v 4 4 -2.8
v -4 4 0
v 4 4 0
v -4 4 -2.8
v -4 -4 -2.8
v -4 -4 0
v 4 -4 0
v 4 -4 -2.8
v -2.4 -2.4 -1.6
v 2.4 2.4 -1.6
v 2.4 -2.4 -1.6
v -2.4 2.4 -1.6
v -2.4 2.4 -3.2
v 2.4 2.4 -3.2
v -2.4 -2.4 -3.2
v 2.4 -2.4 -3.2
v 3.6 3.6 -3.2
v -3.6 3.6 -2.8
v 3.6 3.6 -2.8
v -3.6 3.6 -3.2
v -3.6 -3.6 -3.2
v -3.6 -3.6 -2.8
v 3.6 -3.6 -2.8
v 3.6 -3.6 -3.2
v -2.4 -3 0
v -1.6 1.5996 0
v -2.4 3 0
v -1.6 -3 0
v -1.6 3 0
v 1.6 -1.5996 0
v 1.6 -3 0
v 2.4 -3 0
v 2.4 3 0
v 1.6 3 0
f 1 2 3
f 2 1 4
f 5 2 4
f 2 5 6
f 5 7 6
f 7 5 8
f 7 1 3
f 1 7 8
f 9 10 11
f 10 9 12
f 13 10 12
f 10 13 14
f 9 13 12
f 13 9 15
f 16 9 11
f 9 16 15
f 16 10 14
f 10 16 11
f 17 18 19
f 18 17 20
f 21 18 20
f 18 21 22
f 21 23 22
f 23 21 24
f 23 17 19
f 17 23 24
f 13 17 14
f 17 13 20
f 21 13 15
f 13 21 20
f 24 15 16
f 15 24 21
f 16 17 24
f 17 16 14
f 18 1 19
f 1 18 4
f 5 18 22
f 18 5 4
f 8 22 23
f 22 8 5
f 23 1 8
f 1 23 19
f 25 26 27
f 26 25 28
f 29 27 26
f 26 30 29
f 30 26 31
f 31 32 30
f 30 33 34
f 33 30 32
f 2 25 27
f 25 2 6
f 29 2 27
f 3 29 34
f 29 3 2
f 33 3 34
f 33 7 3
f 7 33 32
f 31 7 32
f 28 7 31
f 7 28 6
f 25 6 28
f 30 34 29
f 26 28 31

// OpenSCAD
// file: ../p/box5.scad
use <../lib.scad>
function ldraw_lib__box5() = [
// 0 Box with 5 Faces and All Edges
// 0 Name: box5.dat
// 0 Author: James Jessiman
// 0 !LDRAW_ORG Primitive UPDATE 2012-01
// 0 !LICENSE Licensed under CC BY 2.0 and CC BY 4.0 : see CAreadme.txt
// 
// 0 BFC CERTIFY CCW
  [0,"BFC","CERTIFY"],
  [0,"BFC","CCW"],
// 
// 0 !HISTORY 2002-04-03 [sbliss] Modified for BFC compliance
// 0 !HISTORY 2002-04-25 [PTadmin] Official Update 2002-02
// 0 !HISTORY 2007-06-24 [PTadmin] Header formatted for Contributor Agreement
// 0 !HISTORY 2008-07-01 [PTadmin] Official Update 2008-01
// 0 !HISTORY 2012-02-16 [Philo] Changed to CCW
// 0 !HISTORY 2012-03-30 [PTadmin] Official Update 2012-01
// 
// 
// 2 24 1 1 1 -1 1 1
  [2,24,1,1,1,-1,1,1],
// 2 24 -1 1 1 -1 1 -1
  [2,24,-1,1,1,-1,1,-1],
// 2 24 -1 1 -1 1 1 -1
  [2,24,-1,1,-1,1,1,-1],
// 2 24 1 1 -1 1 1 1
  [2,24,1,1,-1,1,1,1],
// 2 24 1 0 1 -1 0 1
  [2,24,1,0,1,-1,0,1],
// 2 24 -1 0 1 -1 0 -1
  [2,24,-1,0,1,-1,0,-1],
// 2 24 -1 0 -1 1 0 -1
  [2,24,-1,0,-1,1,0,-1],
// 2 24 1 0 -1 1 0 1
  [2,24,1,0,-1,1,0,1],
// 2 24 1 0 1 1 1 1
  [2,24,1,0,1,1,1,1],
// 2 24 -1 0 1 -1 1 1
  [2,24,-1,0,1,-1,1,1],
// 2 24 1 0 -1 1 1 -1
  [2,24,1,0,-1,1,1,-1],
// 2 24 -1 0 -1 -1 1 -1
  [2,24,-1,0,-1,-1,1,-1],
// 4 16 -1 1 1 1 1 1 1 1 -1 -1 1 -1
  [4,16,-1,1,1,1,1,1,1,1,-1,-1,1,-1],
// 4 16 -1 1 1 -1 0 1 1 0 1 1 1 1
  [4,16,-1,1,1,-1,0,1,1,0,1,1,1,1],
// 4 16 -1 1 -1 -1 0 -1 -1 0 1 -1 1 1
  [4,16,-1,1,-1,-1,0,-1,-1,0,1,-1,1,1],
// 4 16 1 1 -1 1 0 -1 -1 0 -1 -1 1 -1
  [4,16,1,1,-1,1,0,-1,-1,0,-1,-1,1,-1],
// 4 16 1 1 1 1 0 1 1 0 -1 1 1 -1
  [4,16,1,1,1,1,0,1,1,0,-1,1,1,-1],
];
makepoly(ldraw_lib__box5(), line=0.2);
// file: ../p/box4.scad
use <../lib.scad>
function ldraw_lib__box4() = [
// 0 Box with 4 Faces (2 Parallel Pairs) and All Edges
// 0 Name: box4.dat
// 0 Author: James Jessiman
// 0 !LDRAW_ORG Primitive UPDATE 2012-01
// 0 !LICENSE Licensed under CC BY 2.0 and CC BY 4.0 : see CAreadme.txt
// 
// 0 BFC CERTIFY CCW
  [0,"BFC","CERTIFY"],
  [0,"BFC","CCW"],
// 
// 0 !HISTORY 2002-04-03 [sbliss] Modified for BFC compliance
// 0 !HISTORY 2002-04-25 [PTadmin] Official Update 2002-02
// 0 !HISTORY 2007-06-24 [PTadmin] Header formatted for Contributor Agreement
// 0 !HISTORY 2008-07-01 [PTadmin] Official Update 2008-01
// 0 !HISTORY 2012-02-16 [Philo] Changed to CCW
// 0 !HISTORY 2012-03-30 [PTadmin] Official Update 2012-01
// 
// 
// 2 24 1 1 1 -1 1 1
  [2,24,1,1,1,-1,1,1],
// 2 24 -1 1 1 -1 1 -1
  [2,24,-1,1,1,-1,1,-1],
// 2 24 -1 1 -1 1 1 -1
  [2,24,-1,1,-1,1,1,-1],
// 2 24 1 1 -1 1 1 1
  [2,24,1,1,-1,1,1,1],
// 2 24 1 0 1 -1 0 1
  [2,24,1,0,1,-1,0,1],
// 2 24 -1 0 1 -1 0 -1
  [2,24,-1,0,1,-1,0,-1],
// 2 24 -1 0 -1 1 0 -1
  [2,24,-1,0,-1,1,0,-1],
// 2 24 1 0 -1 1 0 1
  [2,24,1,0,-1,1,0,1],
// 2 24 1 0 1 1 1 1
  [2,24,1,0,1,1,1,1],
// 2 24 -1 0 1 -1 1 1
  [2,24,-1,0,1,-1,1,1],
// 2 24 1 0 -1 1 1 -1
  [2,24,1,0,-1,1,1,-1],
// 2 24 -1 0 -1 -1 1 -1
  [2,24,-1,0,-1,-1,1,-1],
// 4 16 -1 1 1 -1 0 1 1 0 1 1 1 1
  [4,16,-1,1,1,-1,0,1,1,0,1,1,1,1],
// 4 16 -1 1 -1 -1 0 -1 -1 0 1 -1 1 1
  [4,16,-1,1,-1,-1,0,-1,-1,0,1,-1,1,1],
// 4 16 1 1 -1 1 0 -1 -1 0 -1 -1 1 -1
  [4,16,1,1,-1,1,0,-1,-1,0,-1,-1,1,-1],
// 4 16 1 1 1 1 0 1 1 0 -1 1 1 -1
  [4,16,1,1,1,1,0,1,1,0,-1,1,1,-1],
];
makepoly(ldraw_lib__box4(), line=0.2);
// file: s/3070bs01.scad
use <../../lib.scad>
use <../../p/box4.scad>
use <../../p/box5.scad>
function ldraw_lib__s__3070bs01() = [
// 0 ~Tile  1 x  1 with Groove without Top Face
// 0 Name: s\3070bs01.dat
// 0 Author: Chris Dee [cwdee]
// 0 !LDRAW_ORG Subpart UPDATE 2009-02
// 0 !LICENSE Licensed under CC BY 2.0 and CC BY 4.0 : see CAreadme.txt
// 
// 0 BFC CERTIFY CCW
  [0,"BFC","CERTIFY"],
  [0,"BFC","CCW"],
// 
// 0 !HISTORY 2009-09-03 [PTadmin] Official Update 2009-02
// 
// 
// 1 16 0 0 0 10 0 0 0 7 0 0 0 10 box4.dat
  [1,16,0,0,0,10,0,0,0,7,0,0,0,10, ldraw_lib__box4()],
// 0 BFC INVERTNEXT
  [0,"BFC","INVERTNEXT"],
// 1 16 0 8 0 6 0 0 0 -4 0 0 0 6 box5.dat
  [1,16,0,8,0,6,0,0,0,-4,0,0,0,6, ldraw_lib__box5()],
// 1 16 0 7 0 9 0 0 0 1 0 0 0 9 box4.dat
  [1,16,0,7,0,9,0,0,0,1,0,0,0,9, ldraw_lib__box4()],
// 
// 4 16 9 8 9 6 8 6 -6 8 6 -9 8 9
  [4,16,9,8,9,6,8,6,-6,8,6,-9,8,9],
// 4 16 -9 8 9 -6 8 6 -6 8 -6 -9 8 -9
  [4,16,-9,8,9,-6,8,6,-6,8,-6,-9,8,-9],
// 4 16 -9 8 -9 -6 8 -6 6 8 -6 9 8 -9
  [4,16,-9,8,-9,-6,8,-6,6,8,-6,9,8,-9],
// 4 16 9 8 -9 6 8 -6 6 8 6 9 8 9
  [4,16,9,8,-9,6,8,-6,6,8,6,9,8,9],
// 
// 4 16 10 7 10 9 7 9 -9 7 9 -10 7 10
  [4,16,10,7,10,9,7,9,-9,7,9,-10,7,10],
// 4 16 -10 7 10 -9 7 9 -9 7 -9 -10 7 -10
  [4,16,-10,7,10,-9,7,9,-9,7,-9,-10,7,-10],
// 4 16 -10 7 -10 -9 7 -9 9 7 -9 10 7 -10
  [4,16,-10,7,-10,-9,7,-9,9,7,-9,10,7,-10],
// 4 16 10 7 -10 9 7 -9 9 7 9 10 7 10
  [4,16,10,7,-10,9,7,-9,9,7,9,10,7,10],
// 0
];
makepoly(ldraw_lib__s__3070bs01(), line=0.2);
// file: s/3070batn.scad
use <../../lib.scad>
function ldraw_lib__s__3070batn() = [
// 0 ~Tile  1 x  1 with "N" Pattern
// 0 Name: s\3070batn.dat
// 0 Author: Chris Dee [cwdee]
// 0 !LDRAW_ORG Subpart UPDATE 2009-01
// 0 !LICENSE Licensed under CC BY 2.0 and CC BY 4.0 : see CAreadme.txt
// 
// 0 BFC CERTIFY CW
  [0,"BFC","CERTIFY"],
  [0,"BFC","CW"],
// 
// 0 !HISTORY 2009-05-02 [PTadmin] Official Update 2009-01
// 
// 
// 4 16 -4 0 -7.5 -6 0 -7.5 -6 0 7.5 -4 0 3.999
  [4,16,-4,0,-7.5,-6,0,-7.5,-6,0,7.5,-4,0,3.999],
// 3 16 -4 0 3.999 -6 0 7.5 -4 0 7.5
  [3,16,-4,0,3.999,-6,0,7.5,-4,0,7.5],
// 4 16 -4 0 3.999 -4 0 7.5 4 0 -3.999 4 0 -7.5
  [4,16,-4,0,3.999,-4,0,7.5,4,0,-3.999,4,0,-7.5],
// 3 16 4 0 -3.999 6 0 -7.5 4 0 -7.5
  [3,16,4,0,-3.999,6,0,-7.5,4,0,-7.5],
// 4 16 4 0 7.5 6 0 7.5 6 0 -7.5 4 0 -3.999
  [4,16,4,0,7.5,6,0,7.5,6,0,-7.5,4,0,-3.999],
// 0
];
makepoly(ldraw_lib__s__3070batn(), line=0.2);
// main file
use <../lib.scad>
use <s/3070batn.scad>
use <s/3070bs01.scad>
function ldraw_lib__3070bptn() = [
// 0 Tile  1 x  1 with Silver "N" Pattern
// 0 Name: 3070bptn.dat
// 0 Author: Chris Dee [cwdee]
// 0 !LDRAW_ORG Part UPDATE 2013-01
// 0 !LICENSE Licensed under CC BY 2.0 and CC BY 4.0 : see CAreadme.txt
// 
// 0 BFC CERTIFY CW
  [0,"BFC","CERTIFY"],
  [0,"BFC","CW"],
// 
// 0 !HISTORY 2009-05-02 [PTadmin] Official Update 2009-01
// 0 !HISTORY 2013-03-09 [MagFors] Changed colour 383 to 80 (printed silver)
// 0 !HISTORY 2013-07-21 [PTadmin] Official Update 2013-01
// 
// 
// 1 16 0 0 0 1 0 0 0 1 0 0 0 1 s\3070bs01.dat
  [1,16,0,0,0,1,0,0,0,1,0,0,0,1, ldraw_lib__s__3070bs01()],
// 1 80 0 0 0 1 0 0 0 1 0 0 0 1 s\3070batn.dat
  [1,80,0,0,0,1,0,0,0,1,0,0,0,1, ldraw_lib__s__3070batn()],
// 4 16 -6 0 -7.5 -10 0 -10 -10 0 10 -6 0 7.5
  [4,16,-6,0,-7.5,-10,0,-10,-10,0,10,-6,0,7.5],
// 3 16 -6 0 7.5 -10 0 10 -4 0 7.5
  [3,16,-6,0,7.5,-10,0,10,-4,0,7.5],
// 4 16 -4 0 7.5 -10 0 10 10 0 10 4 0 7.5
  [4,16,-4,0,7.5,-10,0,10,10,0,10,4,0,7.5],
// 3 16 4 0 7.5 10 0 10 6 0 7.5
  [3,16,4,0,7.5,10,0,10,6,0,7.5],
// 4 16 6 0 7.5 10 0 10 10 0 -10 6 0 -7.5
  [4,16,6,0,7.5,10,0,10,10,0,-10,6,0,-7.5],
// 3 16 6 0 -7.5 10 0 -10 4 0 -7.5
  [3,16,6,0,-7.5,10,0,-10,4,0,-7.5],
// 4 16 4 0 -7.5 10 0 -10 -10 0 -10 -4 0 -7.5
  [4,16,4,0,-7.5,10,0,-10,-10,0,-10,-4,0,-7.5],
// 3 16 -4 0 -7.5 -10 0 -10 -6 0 -7.5
  [3,16,-4,0,-7.5,-10,0,-10,-6,0,-7.5],
// 3 16 -4 0 7.5 4 0 7.5 4 0 -3.999
  [3,16,-4,0,7.5,4,0,7.5,4,0,-3.999],
// 3 16 4 0 -7.5 -4 0 -7.5 -4 0 3.999
  [3,16,4,0,-7.5,-4,0,-7.5,-4,0,3.999],
// 
];
makepoly(ldraw_lib__3070bptn(), line=0.2);
